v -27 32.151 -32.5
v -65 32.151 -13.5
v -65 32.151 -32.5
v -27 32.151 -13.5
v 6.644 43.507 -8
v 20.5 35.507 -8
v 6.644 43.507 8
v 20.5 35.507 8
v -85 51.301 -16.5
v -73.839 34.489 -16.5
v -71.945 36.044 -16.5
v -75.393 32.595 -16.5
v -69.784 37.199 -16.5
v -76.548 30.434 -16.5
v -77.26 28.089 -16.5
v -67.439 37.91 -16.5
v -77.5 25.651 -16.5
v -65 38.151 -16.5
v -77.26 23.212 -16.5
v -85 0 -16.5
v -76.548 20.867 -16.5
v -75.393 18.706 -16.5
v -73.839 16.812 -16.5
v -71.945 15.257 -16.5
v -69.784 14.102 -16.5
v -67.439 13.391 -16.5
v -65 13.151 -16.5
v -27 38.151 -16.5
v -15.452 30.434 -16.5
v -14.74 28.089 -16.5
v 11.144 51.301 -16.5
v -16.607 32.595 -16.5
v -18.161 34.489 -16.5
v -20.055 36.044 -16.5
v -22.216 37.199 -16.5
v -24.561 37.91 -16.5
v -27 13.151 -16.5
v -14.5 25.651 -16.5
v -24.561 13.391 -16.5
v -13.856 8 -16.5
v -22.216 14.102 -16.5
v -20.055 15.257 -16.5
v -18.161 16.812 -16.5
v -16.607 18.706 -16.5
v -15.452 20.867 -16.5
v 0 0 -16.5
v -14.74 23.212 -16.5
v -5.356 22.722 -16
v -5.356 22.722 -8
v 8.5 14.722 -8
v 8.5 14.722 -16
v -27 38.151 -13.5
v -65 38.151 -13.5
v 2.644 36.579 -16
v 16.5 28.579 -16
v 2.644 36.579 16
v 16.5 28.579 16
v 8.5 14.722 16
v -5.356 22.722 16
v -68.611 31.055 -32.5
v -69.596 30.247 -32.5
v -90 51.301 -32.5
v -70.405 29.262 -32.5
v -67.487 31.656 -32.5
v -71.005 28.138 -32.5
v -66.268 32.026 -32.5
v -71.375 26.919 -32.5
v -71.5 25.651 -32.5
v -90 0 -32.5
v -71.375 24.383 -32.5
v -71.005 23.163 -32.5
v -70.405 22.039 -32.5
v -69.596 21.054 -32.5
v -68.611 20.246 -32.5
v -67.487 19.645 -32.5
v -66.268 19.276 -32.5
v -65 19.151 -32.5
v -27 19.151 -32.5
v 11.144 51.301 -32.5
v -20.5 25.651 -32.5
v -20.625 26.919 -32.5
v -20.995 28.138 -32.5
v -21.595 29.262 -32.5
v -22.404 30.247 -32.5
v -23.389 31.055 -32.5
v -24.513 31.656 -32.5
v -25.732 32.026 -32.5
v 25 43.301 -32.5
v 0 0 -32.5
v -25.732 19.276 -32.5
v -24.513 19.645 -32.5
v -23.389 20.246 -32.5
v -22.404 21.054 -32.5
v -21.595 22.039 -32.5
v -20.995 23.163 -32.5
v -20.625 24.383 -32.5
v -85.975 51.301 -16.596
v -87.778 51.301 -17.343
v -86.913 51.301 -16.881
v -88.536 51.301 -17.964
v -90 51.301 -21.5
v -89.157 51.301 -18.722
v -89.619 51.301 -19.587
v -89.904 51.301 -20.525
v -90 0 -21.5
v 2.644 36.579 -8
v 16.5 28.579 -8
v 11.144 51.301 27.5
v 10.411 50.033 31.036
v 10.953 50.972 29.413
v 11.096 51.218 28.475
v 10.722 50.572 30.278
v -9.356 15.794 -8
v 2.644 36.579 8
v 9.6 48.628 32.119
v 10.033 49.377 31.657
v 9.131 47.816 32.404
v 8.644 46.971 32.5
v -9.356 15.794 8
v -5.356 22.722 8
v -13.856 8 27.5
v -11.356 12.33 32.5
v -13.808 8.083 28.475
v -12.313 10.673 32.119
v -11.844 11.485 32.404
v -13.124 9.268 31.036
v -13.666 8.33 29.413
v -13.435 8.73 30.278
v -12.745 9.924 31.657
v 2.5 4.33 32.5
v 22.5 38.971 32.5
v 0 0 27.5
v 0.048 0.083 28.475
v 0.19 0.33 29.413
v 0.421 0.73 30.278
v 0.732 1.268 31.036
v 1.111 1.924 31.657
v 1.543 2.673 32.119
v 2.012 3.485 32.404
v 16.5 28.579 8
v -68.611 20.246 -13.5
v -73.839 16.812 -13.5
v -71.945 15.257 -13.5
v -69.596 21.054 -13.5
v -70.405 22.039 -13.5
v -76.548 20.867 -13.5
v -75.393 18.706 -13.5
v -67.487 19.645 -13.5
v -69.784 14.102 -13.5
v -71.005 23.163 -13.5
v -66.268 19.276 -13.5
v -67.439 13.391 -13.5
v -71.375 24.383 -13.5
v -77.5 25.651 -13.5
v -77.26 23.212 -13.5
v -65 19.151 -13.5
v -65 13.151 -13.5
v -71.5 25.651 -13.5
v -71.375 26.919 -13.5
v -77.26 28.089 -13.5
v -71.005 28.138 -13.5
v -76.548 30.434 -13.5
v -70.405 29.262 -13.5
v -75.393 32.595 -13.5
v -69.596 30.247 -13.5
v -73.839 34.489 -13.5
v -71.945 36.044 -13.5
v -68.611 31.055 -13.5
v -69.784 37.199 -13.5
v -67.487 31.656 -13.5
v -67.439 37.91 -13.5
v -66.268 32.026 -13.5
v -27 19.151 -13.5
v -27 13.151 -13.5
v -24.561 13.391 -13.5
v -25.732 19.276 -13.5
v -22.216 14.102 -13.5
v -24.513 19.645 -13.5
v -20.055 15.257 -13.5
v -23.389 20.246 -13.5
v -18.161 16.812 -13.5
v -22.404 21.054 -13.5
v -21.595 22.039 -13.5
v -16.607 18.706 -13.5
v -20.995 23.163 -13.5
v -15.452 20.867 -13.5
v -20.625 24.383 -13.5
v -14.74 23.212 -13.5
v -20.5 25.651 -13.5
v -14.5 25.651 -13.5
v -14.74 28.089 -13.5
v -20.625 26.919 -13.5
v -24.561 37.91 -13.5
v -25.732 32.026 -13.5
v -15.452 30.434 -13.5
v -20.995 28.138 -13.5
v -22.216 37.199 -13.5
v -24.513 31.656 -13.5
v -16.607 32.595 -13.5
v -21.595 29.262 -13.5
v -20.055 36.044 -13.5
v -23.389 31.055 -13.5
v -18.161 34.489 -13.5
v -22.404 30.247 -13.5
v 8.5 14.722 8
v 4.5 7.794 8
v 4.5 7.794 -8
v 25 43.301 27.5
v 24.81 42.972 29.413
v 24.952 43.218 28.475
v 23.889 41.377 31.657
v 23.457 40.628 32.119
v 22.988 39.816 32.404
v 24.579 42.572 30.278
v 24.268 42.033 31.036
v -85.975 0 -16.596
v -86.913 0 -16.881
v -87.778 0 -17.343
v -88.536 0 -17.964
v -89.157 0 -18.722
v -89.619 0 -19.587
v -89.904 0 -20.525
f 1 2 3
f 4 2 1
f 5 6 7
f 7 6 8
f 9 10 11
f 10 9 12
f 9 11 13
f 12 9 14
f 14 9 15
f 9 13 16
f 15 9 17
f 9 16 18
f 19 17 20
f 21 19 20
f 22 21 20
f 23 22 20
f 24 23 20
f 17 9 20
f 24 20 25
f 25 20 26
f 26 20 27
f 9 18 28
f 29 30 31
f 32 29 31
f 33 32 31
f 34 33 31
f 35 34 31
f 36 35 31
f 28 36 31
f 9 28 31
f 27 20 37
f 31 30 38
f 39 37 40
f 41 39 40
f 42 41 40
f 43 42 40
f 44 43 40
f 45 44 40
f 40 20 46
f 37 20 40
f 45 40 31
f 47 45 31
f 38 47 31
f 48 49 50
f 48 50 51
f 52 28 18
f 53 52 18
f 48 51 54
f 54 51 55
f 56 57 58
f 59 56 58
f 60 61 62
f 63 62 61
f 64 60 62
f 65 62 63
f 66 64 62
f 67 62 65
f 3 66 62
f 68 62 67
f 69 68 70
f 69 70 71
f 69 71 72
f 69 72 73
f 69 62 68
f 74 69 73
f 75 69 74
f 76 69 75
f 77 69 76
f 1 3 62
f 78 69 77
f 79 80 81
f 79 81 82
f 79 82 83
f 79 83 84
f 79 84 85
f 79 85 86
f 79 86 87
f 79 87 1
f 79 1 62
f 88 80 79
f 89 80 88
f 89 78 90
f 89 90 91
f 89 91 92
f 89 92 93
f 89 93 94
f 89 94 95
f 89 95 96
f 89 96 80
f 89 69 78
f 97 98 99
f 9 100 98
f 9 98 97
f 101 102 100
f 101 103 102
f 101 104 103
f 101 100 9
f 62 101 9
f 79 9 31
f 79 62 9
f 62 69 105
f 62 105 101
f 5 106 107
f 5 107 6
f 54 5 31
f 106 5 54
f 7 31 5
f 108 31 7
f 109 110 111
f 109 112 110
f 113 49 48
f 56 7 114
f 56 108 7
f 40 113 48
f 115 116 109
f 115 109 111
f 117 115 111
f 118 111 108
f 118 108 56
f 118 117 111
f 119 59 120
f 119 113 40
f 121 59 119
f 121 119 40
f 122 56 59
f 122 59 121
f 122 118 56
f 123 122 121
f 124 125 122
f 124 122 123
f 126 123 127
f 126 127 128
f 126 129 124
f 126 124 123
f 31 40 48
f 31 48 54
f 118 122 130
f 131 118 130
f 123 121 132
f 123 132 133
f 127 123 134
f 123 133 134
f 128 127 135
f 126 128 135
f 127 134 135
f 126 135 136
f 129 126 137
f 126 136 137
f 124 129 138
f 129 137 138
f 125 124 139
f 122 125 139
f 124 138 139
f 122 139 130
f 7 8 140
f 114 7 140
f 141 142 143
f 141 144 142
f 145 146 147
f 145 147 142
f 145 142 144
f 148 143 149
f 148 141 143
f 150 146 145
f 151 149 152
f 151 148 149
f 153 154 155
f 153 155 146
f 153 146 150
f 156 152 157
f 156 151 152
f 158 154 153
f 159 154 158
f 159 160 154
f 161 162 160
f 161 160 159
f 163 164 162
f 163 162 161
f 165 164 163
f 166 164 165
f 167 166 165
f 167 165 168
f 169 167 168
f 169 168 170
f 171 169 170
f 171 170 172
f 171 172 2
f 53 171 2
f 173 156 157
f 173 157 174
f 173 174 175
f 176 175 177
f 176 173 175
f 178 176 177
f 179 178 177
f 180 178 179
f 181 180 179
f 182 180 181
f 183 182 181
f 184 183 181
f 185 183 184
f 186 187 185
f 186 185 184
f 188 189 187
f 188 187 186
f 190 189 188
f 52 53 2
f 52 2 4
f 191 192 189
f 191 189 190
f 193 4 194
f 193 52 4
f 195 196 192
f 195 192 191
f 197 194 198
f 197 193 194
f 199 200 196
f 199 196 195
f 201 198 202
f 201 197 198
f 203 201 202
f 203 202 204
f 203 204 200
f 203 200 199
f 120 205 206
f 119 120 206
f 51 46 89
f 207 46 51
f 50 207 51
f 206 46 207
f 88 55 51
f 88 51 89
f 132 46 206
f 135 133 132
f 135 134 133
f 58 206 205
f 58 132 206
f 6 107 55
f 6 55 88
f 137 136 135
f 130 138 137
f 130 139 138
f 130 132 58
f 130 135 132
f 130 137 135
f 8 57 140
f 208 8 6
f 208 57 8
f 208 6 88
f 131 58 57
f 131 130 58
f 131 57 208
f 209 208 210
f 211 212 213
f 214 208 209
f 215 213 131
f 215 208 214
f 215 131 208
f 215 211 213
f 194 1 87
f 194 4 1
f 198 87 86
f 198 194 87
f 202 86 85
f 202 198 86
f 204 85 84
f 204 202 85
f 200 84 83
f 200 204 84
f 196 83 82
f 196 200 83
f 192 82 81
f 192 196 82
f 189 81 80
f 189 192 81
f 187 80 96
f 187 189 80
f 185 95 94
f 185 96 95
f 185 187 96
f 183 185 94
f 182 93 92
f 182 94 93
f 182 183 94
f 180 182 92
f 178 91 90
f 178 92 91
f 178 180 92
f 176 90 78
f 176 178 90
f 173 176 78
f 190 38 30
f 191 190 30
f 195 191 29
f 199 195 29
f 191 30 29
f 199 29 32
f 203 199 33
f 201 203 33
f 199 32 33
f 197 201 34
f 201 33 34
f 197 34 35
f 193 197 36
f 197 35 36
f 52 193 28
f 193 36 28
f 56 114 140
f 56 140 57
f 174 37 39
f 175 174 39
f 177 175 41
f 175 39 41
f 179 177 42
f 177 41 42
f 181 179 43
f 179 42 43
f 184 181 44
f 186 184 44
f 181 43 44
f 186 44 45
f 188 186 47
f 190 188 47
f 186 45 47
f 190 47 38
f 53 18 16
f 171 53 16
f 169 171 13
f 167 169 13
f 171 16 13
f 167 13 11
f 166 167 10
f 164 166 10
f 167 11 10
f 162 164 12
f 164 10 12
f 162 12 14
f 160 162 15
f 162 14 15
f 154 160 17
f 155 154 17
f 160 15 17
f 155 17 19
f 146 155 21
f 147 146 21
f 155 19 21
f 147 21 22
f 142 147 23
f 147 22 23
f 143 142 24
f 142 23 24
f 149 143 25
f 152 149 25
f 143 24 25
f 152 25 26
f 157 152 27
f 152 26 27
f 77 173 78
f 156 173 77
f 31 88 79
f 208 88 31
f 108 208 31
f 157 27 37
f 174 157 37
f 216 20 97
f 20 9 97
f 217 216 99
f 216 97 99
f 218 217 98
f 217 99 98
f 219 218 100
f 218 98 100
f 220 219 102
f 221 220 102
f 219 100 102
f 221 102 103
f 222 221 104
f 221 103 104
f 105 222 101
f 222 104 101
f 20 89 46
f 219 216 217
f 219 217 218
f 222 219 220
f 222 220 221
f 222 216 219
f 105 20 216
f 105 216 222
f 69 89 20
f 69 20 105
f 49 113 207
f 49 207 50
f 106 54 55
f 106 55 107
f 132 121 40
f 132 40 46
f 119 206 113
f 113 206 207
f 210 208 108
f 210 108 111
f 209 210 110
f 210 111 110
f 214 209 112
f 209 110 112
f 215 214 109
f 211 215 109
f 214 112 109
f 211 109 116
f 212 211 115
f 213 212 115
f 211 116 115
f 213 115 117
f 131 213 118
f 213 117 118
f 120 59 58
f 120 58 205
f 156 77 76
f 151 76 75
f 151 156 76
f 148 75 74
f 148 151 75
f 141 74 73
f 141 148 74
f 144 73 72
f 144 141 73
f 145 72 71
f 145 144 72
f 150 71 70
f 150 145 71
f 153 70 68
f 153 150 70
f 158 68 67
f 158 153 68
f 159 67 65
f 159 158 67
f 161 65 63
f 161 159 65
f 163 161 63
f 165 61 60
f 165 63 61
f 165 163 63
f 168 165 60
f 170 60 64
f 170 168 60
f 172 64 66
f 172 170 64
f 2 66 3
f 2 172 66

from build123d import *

# Parameters (mm, degrees)
F1_DEPTH  = 32.5
F5_DEPTH  = 16
F6_R      = 5
F8_DEPTH  = 3
F9_DEPTH  = 16.001
F11_DEPTH = 20
F12_R     = 5


with BuildPart() as f1:
    # F0 (on Top) → F1 (new body, symmetric)
    with BuildSketch(Plane.XY):
        Polygon((-13.8564064606, 8), (0, 0), (25, 43.3012701892), (11.1435935394, 51.3012701892), align=None)
    extrude(amount=F1_DEPTH, both=True)

    # F4 (on face) → F5 (join)
    with BuildSketch(Plane(origin=(0, 0, -32.5), x_dir=(1, 0, 0), z_dir=(0, 0, -1))):
        Polygon((-13.8564064606, -8), (0, 0), (-90, 0), (-90, -51.3012701892), (11.1435935394, -51.3012701892), align=None)
    extrude(amount=-F5_DEPTH)

    # F6
    f6_edges = [f1.edges().sort_by_distance(p)[0] for p in [
        (-6.928203, 4, 32.5),
        (18.071797, 47.30127, 32.5),
    ]]
    fillet(f6_edges, radius=F6_R)

    # F7 (on face) → F8 (join)
    with BuildSketch(Plane.XY.offset(-16.5)):
        with BuildLine():
            ThreePointArc((-65, 38.1506350946), (-77.5, 25.6506350946), (-65, 13.1506350946))
            Line((-65, 13.1506350946), (-65, 19.1506350946))
            ThreePointArc((-65, 19.1506350946), (-71.5, 25.6506350946), (-65, 32.1506350946))
            Line((-65, 32.1506350946), (-65, 38.1506350946))
        make_face()
        with BuildLine():
            Line((-65, 19.1506350946), (-65, 13.1506350946))
            ThreePointArc((-65, 13.1506350946), (-58.876275643, 14.7533877358), (-54.322921748, 19.1506350946))
            Line((-54.322921748, 19.1506350946), (-65, 19.1506350946))
        make_face()
        with BuildLine():
            Line((-65, 13.1506350946), (-27, 13.1506350946))
            ThreePointArc((-27, 13.1506350946), (-33.123724357, 14.7533877358), (-37.677078252, 19.1506350946))
            Line((-37.677078252, 19.1506350946), (-54.322921748, 19.1506350946))
            ThreePointArc((-54.322921748, 19.1506350946), (-58.876275643, 14.7533877358), (-65, 13.1506350946))
        make_face()
        with BuildLine():
            Line((-27, 19.1506350946), (-27, 13.1506350946))
            ThreePointArc((-27, 13.1506350946), (-18.1611652352, 16.8118003298), (-14.5, 25.6506350946))
            ThreePointArc((-14.5, 25.6506350946), (-18.1611652352, 34.4894698594), (-27, 38.1506350946))
            Line((-27, 38.1506350946), (-27, 32.1506350946))
            ThreePointArc((-27, 32.1506350946), (-22.4038059223, 30.2468291723), (-20.5, 25.6506350946))
            ThreePointArc((-20.5, 25.6506350946), (-22.4038059223, 21.0544410169), (-27, 19.1506350946))
        make_face()
        with BuildLine():
            ThreePointArc((-37.677078252, 19.1506350946), (-33.123724357, 14.7533877358), (-27, 13.1506350946))
            Line((-27, 13.1506350946), (-27, 19.1506350946))
            Line((-27, 19.1506350946), (-37.677078252, 19.1506350946))
        make_face()
        with BuildLine():
            Line((-37.677078252, 32.1506350946), (-27, 32.1506350946))
            Line((-27, 32.1506350946), (-27, 38.1506350946))
            ThreePointArc((-27, 38.1506350946), (-33.123724357, 36.5478824535), (-37.677078252, 32.1506350946))
        make_face()
        with BuildLine():
            ThreePointArc((-54.322921748, 32.1506350946), (-58.876275643, 36.5478824535), (-65, 38.1506350946))
            Line((-65, 38.1506350946), (-65, 32.1506350946))
            Line((-65, 32.1506350946), (-54.322921748, 32.1506350946))
        make_face()
        with BuildLine():
            Line((-27, 38.1506350946), (-65, 38.1506350946))
            ThreePointArc((-65, 38.1506350946), (-58.876275643, 36.5478824535), (-54.322921748, 32.1506350946))
            Line((-54.322921748, 32.1506350946), (-37.677078252, 32.1506350946))
            ThreePointArc((-37.677078252, 32.1506350946), (-33.123724357, 36.5478824535), (-27, 38.1506350946))
        make_face()
    extrude(amount=F8_DEPTH)

    # F9 (cut, through all): a face of the model
    f9_faces = [f1.faces().sort_by_distance(p)[0] for p in [
        (-46, 25.6506350946, -16.5),
    ]]
    extrude(f9_faces, amount=-F9_DEPTH, mode=Mode.SUBTRACT)

    # F10 (on face) → F11 (cut)
    with BuildSketch(Plane(origin=(0, 0, 0), x_dir=(0.5, 0.8660254038, 0), z_dir=(0.8660254038, -0.5, 0))):
        Polygon((33, -8), (41, -8), (41, 8), (33, 8), (33, 16), (17, 16), (17, 8), (9, 8), (9, -8), (17, -8), (17, -16), (33, -16), align=None)
    extrude(amount=-F11_DEPTH, mode=Mode.SUBTRACT)

    # F12
    f12_edges = [f1.edges().sort_by_distance(p)[0] for p in [
        (-90, 25.650635, -16.5),
    ]]
    fillet(f12_edges, radius=F12_R)


solid = f1.part
